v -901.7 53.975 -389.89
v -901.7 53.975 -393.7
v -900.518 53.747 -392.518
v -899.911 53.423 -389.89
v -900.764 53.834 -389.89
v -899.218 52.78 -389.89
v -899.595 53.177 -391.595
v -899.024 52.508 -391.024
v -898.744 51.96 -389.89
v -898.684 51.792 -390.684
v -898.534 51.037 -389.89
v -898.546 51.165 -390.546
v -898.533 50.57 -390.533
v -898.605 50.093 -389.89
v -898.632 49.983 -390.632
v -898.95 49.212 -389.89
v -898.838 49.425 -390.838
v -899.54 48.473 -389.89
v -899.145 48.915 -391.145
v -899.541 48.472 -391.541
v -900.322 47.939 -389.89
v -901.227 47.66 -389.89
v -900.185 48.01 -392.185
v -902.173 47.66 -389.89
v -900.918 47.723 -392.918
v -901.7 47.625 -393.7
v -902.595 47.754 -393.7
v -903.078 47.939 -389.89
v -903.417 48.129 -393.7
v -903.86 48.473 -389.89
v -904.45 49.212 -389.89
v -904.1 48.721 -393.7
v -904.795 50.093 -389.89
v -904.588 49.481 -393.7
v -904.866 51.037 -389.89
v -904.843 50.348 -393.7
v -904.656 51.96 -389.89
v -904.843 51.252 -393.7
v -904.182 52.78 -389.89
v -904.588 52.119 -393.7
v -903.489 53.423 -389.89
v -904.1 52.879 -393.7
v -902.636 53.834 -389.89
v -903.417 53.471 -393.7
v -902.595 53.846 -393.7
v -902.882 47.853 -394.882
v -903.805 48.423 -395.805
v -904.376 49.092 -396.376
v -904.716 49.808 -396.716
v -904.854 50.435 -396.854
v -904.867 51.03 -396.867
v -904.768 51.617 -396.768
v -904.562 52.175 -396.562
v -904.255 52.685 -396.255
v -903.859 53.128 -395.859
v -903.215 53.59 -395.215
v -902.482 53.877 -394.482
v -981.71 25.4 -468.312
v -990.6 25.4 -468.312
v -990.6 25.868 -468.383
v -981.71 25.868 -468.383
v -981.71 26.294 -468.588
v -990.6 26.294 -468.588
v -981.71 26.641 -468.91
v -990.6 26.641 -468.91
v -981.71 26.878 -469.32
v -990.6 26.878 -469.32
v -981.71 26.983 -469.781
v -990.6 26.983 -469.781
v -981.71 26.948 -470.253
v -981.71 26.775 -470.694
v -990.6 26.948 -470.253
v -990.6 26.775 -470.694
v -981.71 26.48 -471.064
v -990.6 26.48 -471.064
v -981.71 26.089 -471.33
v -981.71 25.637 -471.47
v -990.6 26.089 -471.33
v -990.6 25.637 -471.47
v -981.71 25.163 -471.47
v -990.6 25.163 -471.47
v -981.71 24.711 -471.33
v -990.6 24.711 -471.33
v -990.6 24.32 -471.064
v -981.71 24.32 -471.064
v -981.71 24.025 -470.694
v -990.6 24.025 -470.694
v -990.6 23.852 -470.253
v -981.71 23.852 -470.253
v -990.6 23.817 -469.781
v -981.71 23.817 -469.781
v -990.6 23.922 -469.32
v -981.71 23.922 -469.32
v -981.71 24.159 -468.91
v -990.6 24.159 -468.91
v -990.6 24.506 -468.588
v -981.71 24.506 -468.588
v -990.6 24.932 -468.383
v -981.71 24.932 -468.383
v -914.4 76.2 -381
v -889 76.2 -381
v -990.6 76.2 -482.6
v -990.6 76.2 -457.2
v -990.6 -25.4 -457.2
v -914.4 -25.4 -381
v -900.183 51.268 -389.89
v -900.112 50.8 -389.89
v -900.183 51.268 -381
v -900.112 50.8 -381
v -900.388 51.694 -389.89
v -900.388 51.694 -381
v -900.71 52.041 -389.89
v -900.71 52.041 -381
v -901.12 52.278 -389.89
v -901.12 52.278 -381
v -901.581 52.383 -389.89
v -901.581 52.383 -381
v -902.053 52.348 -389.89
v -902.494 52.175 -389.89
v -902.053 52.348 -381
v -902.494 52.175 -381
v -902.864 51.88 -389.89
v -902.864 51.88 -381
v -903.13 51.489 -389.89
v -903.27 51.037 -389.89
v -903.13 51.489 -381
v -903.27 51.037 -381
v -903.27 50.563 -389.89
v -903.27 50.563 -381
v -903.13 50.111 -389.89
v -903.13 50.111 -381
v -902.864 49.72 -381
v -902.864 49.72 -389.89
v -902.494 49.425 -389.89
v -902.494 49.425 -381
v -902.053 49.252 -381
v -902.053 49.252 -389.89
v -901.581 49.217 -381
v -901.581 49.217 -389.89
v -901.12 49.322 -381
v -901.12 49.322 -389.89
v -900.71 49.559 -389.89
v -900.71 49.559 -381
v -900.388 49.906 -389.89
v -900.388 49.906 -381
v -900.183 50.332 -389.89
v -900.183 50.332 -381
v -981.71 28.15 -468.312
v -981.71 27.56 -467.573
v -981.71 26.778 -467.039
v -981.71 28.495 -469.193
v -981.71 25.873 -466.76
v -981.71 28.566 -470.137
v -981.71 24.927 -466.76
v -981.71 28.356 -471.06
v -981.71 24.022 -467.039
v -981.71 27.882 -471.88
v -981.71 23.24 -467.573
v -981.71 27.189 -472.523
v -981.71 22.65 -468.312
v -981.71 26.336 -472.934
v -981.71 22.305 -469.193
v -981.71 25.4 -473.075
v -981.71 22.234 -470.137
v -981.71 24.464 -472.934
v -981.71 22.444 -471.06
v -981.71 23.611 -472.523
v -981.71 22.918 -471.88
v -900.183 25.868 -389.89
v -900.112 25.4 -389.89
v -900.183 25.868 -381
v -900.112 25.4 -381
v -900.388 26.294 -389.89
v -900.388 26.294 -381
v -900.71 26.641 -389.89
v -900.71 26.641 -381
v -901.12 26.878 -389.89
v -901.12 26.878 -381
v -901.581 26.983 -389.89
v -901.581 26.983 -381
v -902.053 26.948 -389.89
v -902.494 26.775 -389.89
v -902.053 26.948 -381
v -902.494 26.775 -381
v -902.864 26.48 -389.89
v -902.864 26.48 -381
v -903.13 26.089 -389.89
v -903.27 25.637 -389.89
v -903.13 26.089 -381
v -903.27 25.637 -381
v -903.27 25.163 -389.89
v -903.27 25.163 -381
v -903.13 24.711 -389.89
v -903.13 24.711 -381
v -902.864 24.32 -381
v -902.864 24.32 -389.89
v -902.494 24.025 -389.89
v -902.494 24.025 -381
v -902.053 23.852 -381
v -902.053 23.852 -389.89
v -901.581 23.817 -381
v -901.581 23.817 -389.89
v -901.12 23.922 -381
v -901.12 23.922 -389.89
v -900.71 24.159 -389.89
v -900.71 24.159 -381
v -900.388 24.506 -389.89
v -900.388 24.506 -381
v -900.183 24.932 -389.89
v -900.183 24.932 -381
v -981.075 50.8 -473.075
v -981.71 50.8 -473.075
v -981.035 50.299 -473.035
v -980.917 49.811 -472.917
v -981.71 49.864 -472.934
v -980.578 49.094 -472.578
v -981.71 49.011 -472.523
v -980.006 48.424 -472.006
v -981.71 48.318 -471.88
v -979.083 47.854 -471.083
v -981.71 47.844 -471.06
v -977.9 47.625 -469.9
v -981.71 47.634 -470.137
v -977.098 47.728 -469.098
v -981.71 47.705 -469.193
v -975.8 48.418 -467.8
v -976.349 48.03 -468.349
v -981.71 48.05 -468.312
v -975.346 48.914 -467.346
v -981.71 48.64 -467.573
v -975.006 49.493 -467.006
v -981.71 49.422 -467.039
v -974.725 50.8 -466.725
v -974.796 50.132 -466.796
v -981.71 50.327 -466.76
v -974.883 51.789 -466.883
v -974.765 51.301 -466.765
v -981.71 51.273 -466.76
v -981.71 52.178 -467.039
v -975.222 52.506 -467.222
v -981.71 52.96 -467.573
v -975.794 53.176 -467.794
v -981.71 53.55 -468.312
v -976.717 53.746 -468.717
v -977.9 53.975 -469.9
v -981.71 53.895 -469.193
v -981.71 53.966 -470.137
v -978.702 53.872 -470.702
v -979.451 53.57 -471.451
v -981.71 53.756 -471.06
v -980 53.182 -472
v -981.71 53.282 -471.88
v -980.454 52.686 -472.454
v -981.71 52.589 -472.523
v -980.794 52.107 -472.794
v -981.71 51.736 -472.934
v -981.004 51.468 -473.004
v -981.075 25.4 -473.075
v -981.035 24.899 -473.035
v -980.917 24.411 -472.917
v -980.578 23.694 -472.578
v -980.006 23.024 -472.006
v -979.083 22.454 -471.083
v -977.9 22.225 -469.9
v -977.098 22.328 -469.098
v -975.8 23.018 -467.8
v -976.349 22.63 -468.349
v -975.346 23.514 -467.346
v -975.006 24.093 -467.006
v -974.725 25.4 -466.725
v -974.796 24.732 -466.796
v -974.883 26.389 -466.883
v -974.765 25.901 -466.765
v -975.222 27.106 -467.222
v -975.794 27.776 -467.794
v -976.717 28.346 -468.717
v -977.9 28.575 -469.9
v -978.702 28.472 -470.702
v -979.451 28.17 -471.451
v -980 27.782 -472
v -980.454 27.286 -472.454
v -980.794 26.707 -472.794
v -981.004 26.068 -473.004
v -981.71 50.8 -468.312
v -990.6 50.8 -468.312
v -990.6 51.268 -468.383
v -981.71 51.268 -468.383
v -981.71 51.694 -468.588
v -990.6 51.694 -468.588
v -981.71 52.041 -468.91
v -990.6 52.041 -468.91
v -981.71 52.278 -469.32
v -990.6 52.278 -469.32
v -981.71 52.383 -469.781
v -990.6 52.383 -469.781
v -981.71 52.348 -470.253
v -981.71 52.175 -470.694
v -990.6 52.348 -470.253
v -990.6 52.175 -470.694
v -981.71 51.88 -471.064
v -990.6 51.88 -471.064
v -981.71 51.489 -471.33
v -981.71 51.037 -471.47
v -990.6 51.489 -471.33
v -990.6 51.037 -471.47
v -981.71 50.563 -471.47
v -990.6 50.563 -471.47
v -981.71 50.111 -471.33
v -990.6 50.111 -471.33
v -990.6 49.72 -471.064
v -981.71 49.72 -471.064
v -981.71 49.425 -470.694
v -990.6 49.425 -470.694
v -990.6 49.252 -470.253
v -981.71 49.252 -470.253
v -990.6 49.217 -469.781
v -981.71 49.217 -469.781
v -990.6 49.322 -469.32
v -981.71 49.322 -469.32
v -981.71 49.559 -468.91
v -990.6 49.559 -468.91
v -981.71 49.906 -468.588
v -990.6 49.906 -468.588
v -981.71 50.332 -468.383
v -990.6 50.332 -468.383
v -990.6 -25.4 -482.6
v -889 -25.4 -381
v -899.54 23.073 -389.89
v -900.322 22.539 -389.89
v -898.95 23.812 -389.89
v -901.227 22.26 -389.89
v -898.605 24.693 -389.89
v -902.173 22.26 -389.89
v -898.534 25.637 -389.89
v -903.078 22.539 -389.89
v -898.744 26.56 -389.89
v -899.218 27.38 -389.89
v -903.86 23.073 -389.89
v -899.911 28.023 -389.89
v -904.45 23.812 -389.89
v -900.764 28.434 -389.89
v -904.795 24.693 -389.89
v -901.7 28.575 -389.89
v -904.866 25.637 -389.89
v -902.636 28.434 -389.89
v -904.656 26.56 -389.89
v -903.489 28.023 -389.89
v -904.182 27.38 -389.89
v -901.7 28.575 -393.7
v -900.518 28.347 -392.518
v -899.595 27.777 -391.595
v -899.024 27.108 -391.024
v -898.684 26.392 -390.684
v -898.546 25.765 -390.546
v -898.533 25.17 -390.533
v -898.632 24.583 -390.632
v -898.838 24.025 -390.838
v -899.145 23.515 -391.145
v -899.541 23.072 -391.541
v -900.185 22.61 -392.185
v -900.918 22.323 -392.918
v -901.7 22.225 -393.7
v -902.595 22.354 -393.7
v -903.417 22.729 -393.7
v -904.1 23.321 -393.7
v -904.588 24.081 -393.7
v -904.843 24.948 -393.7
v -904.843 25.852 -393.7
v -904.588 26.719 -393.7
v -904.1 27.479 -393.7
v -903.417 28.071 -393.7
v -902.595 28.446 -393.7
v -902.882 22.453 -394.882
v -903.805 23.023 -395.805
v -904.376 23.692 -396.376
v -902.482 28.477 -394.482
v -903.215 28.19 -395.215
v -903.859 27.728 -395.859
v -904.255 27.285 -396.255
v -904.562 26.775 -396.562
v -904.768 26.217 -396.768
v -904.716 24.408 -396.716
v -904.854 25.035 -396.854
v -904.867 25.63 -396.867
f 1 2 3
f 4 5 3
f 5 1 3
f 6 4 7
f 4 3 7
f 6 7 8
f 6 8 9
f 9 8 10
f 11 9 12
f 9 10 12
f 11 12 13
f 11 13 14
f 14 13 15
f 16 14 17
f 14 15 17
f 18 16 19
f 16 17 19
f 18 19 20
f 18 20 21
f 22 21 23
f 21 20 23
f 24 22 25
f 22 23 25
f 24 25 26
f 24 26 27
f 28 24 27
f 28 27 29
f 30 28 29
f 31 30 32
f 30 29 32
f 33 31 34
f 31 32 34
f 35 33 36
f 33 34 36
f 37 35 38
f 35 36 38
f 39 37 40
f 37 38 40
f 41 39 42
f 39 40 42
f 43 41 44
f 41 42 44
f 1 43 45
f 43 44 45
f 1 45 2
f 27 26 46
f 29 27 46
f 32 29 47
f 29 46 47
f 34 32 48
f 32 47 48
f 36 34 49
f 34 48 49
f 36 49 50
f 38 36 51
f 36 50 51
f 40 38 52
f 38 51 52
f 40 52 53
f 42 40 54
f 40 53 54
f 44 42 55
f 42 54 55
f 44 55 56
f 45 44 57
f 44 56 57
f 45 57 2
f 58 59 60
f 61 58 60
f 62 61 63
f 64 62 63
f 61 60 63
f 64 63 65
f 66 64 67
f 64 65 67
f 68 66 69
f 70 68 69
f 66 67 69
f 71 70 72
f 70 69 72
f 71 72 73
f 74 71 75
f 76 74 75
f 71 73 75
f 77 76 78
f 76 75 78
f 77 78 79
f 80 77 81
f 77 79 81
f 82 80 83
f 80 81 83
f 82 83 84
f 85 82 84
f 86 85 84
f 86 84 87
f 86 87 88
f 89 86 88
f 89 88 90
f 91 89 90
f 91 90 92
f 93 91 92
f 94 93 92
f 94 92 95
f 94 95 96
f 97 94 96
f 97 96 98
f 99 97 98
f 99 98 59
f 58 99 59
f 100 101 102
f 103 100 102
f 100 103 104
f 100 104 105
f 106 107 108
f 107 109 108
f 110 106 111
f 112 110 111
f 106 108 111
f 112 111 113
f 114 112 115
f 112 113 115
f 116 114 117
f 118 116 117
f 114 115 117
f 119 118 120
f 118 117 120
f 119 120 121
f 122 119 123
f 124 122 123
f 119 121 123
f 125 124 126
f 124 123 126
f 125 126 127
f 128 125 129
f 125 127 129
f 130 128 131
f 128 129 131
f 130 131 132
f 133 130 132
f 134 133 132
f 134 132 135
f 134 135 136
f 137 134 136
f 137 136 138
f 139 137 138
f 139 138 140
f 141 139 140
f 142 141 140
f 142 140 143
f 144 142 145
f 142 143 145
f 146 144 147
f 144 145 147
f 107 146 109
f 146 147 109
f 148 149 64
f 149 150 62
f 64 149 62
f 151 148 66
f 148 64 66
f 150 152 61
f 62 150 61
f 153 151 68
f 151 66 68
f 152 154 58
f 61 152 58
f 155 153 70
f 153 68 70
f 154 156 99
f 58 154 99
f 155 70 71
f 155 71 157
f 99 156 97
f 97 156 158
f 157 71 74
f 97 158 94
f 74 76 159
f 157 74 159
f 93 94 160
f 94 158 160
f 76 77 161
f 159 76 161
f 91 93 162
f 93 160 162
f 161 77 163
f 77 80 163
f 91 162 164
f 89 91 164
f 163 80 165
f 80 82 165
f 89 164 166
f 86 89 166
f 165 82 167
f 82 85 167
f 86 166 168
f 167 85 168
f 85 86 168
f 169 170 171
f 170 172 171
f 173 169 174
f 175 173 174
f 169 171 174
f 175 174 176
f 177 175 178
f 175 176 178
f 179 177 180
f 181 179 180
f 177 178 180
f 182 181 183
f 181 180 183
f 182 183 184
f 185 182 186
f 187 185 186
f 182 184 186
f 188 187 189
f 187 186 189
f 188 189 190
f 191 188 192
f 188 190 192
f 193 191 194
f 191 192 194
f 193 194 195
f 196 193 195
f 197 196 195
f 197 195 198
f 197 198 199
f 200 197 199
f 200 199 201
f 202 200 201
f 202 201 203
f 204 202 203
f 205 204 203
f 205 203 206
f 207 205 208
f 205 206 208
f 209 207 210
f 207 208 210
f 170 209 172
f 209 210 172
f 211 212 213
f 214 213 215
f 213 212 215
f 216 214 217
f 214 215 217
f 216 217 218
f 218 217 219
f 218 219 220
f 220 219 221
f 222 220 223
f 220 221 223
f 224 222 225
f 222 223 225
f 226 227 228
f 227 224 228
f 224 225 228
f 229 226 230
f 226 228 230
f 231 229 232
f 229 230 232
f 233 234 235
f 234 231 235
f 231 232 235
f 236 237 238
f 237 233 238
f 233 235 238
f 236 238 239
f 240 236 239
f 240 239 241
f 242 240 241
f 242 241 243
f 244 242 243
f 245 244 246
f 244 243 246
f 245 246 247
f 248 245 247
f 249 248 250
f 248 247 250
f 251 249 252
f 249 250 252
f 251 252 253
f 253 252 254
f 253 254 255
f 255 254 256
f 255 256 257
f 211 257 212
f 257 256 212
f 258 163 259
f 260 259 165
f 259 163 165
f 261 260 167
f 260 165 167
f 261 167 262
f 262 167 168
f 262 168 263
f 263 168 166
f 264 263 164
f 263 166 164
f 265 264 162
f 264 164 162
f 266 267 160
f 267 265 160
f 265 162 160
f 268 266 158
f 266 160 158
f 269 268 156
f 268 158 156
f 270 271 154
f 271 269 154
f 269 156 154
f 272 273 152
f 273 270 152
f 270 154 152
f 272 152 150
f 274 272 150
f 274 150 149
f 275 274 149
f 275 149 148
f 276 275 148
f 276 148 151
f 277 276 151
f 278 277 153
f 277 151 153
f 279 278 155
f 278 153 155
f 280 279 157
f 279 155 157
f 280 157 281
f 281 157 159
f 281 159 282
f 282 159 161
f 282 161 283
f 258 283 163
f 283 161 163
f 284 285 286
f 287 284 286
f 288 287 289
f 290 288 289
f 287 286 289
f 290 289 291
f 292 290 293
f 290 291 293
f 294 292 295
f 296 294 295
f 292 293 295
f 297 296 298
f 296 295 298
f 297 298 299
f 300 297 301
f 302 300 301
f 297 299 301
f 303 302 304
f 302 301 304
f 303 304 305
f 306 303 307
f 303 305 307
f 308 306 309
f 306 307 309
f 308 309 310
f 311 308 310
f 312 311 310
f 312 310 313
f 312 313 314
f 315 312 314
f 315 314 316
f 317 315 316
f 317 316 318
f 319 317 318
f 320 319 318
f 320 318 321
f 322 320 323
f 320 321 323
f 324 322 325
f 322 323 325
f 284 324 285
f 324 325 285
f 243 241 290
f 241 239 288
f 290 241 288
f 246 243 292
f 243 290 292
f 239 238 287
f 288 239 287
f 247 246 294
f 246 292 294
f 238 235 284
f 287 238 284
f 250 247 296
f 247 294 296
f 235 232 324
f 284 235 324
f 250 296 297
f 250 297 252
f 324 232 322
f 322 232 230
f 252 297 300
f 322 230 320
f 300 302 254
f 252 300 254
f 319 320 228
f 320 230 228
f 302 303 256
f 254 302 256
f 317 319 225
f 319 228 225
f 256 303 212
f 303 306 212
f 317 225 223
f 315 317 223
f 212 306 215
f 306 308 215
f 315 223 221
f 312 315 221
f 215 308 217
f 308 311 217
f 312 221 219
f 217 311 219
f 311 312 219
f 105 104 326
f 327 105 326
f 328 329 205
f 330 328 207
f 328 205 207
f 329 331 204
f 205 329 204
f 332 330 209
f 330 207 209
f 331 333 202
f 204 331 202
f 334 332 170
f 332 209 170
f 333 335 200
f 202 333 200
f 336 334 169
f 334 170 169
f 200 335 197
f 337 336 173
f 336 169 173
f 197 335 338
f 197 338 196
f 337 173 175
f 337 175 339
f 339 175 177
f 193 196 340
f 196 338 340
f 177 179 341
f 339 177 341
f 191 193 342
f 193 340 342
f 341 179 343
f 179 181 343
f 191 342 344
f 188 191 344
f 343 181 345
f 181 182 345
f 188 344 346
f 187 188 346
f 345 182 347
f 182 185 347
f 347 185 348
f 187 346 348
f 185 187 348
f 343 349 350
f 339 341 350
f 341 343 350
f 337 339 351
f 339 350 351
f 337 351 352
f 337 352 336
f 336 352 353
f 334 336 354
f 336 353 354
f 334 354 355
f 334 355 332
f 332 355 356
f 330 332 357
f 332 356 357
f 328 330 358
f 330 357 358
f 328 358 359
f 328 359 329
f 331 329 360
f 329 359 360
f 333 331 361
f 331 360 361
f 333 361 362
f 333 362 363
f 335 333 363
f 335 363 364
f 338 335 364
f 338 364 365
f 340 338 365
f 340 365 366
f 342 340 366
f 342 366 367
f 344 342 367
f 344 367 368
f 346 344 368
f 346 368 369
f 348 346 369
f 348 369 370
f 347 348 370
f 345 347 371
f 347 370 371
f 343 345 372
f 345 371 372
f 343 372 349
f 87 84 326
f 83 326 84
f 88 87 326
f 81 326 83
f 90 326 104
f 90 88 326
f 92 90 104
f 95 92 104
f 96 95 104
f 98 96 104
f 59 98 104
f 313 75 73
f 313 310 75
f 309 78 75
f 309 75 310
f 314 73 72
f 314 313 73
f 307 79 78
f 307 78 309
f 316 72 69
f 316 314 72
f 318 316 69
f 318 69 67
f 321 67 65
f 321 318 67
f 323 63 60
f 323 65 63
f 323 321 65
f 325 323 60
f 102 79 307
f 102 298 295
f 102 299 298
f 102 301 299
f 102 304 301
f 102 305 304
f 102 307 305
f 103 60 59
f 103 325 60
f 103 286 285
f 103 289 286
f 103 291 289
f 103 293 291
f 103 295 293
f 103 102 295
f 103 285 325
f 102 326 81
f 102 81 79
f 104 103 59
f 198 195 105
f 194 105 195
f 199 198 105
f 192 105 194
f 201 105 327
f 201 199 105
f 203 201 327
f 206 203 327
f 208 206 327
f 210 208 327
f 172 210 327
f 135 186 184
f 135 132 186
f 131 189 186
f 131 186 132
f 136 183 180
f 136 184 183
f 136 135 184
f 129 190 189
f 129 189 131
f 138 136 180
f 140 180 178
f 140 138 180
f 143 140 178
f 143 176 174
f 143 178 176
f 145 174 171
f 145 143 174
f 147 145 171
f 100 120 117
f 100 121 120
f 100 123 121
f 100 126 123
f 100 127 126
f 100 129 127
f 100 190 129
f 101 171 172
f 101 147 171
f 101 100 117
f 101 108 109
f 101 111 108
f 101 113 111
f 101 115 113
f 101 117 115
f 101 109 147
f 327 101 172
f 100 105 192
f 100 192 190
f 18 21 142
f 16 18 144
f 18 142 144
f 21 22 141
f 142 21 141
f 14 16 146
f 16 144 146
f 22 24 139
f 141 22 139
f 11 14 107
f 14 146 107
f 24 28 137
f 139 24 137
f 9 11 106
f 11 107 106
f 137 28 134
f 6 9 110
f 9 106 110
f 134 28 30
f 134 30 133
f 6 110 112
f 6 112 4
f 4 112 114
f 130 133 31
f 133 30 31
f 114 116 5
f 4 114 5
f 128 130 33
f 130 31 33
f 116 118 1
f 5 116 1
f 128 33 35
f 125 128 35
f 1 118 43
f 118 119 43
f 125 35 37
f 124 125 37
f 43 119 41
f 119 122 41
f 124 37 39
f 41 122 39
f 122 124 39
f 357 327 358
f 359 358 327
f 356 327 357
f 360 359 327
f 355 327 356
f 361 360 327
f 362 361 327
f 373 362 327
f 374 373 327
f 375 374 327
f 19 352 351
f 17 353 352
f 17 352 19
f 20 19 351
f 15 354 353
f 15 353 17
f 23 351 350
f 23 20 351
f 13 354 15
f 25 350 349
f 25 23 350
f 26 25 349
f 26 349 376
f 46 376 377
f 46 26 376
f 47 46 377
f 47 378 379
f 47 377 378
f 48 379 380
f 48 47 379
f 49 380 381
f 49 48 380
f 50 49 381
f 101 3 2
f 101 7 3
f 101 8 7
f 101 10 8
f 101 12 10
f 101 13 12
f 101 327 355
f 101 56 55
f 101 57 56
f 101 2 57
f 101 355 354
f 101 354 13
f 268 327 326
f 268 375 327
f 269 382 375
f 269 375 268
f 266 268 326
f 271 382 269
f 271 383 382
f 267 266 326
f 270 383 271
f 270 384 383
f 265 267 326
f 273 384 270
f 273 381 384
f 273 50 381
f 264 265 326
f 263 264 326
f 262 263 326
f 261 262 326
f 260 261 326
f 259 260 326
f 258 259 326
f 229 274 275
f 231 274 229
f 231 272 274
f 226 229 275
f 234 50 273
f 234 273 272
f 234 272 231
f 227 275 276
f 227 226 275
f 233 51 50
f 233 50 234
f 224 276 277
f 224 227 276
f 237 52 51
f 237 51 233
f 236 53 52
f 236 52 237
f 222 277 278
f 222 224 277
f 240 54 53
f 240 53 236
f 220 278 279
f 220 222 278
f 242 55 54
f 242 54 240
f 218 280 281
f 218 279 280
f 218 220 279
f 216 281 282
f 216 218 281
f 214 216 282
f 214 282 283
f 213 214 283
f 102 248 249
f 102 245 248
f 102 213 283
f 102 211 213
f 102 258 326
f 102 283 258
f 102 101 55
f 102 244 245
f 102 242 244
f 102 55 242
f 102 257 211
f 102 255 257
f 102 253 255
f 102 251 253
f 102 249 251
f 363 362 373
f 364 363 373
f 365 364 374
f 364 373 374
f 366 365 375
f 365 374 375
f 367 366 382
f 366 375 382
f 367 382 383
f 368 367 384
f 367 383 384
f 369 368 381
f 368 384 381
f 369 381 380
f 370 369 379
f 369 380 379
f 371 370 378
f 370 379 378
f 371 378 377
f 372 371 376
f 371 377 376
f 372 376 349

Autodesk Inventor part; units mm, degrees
ref_plane "YZ Plane" through (0, 0, 0) normal (1, 0, 0) x (0, 1, 0)
ref_plane "XZ Plane" through (0, 0, 0) normal (0, 1, 0) x (-1, 0, 0)
ref_plane "XY Plane" through (0, 0, 0) normal (0, 0, 1) x (1, 0, 0)
sketch "Sketch1" plane through (0, 0, 0) normal (0, 1, 0) x (-1, 0, 0)
  line L0 (6.35, 0) -> (1365.25, 0)
  line L1 (1371.6, -6.35) -> (1371.6, -1365.25)
  line L2 (1365.25, -1371.6) -> (6.35, -1371.6)
  line L3 (0, -1365.25) -> (0, -6.35)
  line L4 (1346.2, -1346.2) -> (1346.2, -25.4)
  line L5 (1346.2, -25.4) -> (25.4, -25.4)
  line L6 (25.4, -25.4) -> (25.4, -1346.2)
  line L7 (25.4, -1346.2) -> (1346.2, -1346.2)
  line L8 (1320.8, -50.8) -> (1320.8, -1320.8)
  line L9 (1320.8, -1320.8) -> (50.8, -1320.8)
  line L10 (50.8, -1320.8) -> (50.8, -50.8)
  line L11 (50.8, -50.8) -> (1320.8, -50.8)
  line L12 (1320.8, -50.8) -> (1346.2, -25.4)
  line L13 (1320.8, -1320.8) -> (1346.2, -1346.2)
  line L14 (50.8, -1320.8) -> (25.4, -1346.2)
  line L15 (50.8, -50.8) -> (25.4, -25.4)
  line L16 (1219.2, -482.6) -> (1016, -482.6)
  line L17 (1016, -482.6) -> (1016, -889)
  line L18 (1016, -889) -> (1219.2, -889)
  line L19 (1219.2, -889) -> (1219.2, -482.6)
  line L20 (355.6, -482.6) -> (152.4, -482.6)
  line L21 (152.4, -482.6) -> (152.4, -889)
  line L22 (152.4, -889) -> (355.6, -889)
  line L23 (355.6, -889) -> (355.6, -482.6)
  line L24 (889, -1016) -> (482.6, -1016)
  line L25 (482.6, -1016) -> (482.6, -1219.2)
  line L26 (482.6, -1219.2) -> (889, -1219.2)
  line L27 (889, -1219.2) -> (889, -1016)
  line L28 (889, -152.4) -> (482.6, -152.4)
  line L29 (482.6, -152.4) -> (482.6, -355.6)
  line L30 (482.6, -355.6) -> (889, -355.6)
  line L31 (889, -355.6) -> (889, -152.4)
  circle A0 centre (685.8, -685.8) radius 254
  line L32 (889, -127) -> (482.6, -127)
  line L33 (457.2, -127) -> (457.2, -381)
  line L34 (457.2, -381) -> (914.4, -381)
  line L35 (914.4, -381) -> (914.4, -127)
  line L36 (1244.6, -457.2) -> (990.6, -457.2)
  line L37 (990.6, -457.2) -> (990.6, -914.4)
  line L38 (990.6, -914.4) -> (1244.6, -914.4)
  line L39 (1244.6, -889) -> (1244.6, -482.6)
  line L40 (914.4, -990.6) -> (457.2, -990.6)
  line L41 (457.2, -990.6) -> (457.2, -1244.6)
  line L42 (482.6, -1244.6) -> (889, -1244.6)
  line L43 (914.4, -1244.6) -> (914.4, -990.6)
  line L44 (381, -457.2) -> (127, -457.2)
  line L45 (127, -482.6) -> (127, -889)
  line L46 (127, -914.4) -> (381, -914.4)
  line L47 (381, -914.4) -> (381, -457.2)
  line L48 (152.4, -482.6) -> (50.8, -482.6)
  line L49 (127, -457.2) -> (50.8, -457.2)
  line L50 (152.4, -889) -> (50.8, -889)
  line L51 (127, -914.4) -> (50.8, -914.4)
  line L52 (355.6, -889) -> (381, -889)
  line L53 (355.6, -482.6) -> (381, -482.6)
  line L54 (457.2, -1244.6) -> (457.2, -1320.8)
  line L55 (482.6, -1219.2) -> (482.6, -1320.8)
  line L56 (889, -1219.2) -> (889, -1320.8)
  line L57 (914.4, -1244.6) -> (914.4, -1320.8)
  line L58 (1244.6, -914.4) -> (1320.8, -914.4)
  line L59 (1219.2, -889) -> (1320.8, -889)
  line L60 (1219.2, -482.6) -> (1320.8, -482.6)
  line L61 (1244.6, -457.2) -> (1320.8, -457.2)
  line L62 (889, -152.4) -> (889, -50.8)
  line L63 (914.4, -127) -> (914.4, -50.8)
  line L64 (482.6, -152.4) -> (482.6, -50.8)
  line L65 (457.2, -127) -> (457.2, -50.8)
  line L66 (889, -1016) -> (889, -990.6)
  line L67 (482.6, -1016) -> (482.6, -990.6)
  line L68 (1016, -889) -> (990.6, -889)
  line L69 (1016, -482.6) -> (990.6, -482.6)
  line L70 (889, -355.6) -> (889, -381)
  line L71 (482.6, -355.6) -> (482.6, -381)
  line L72 (914.4, -381) -> (990.6, -457.2)
  line L73 (990.6, -482.6) -> (889, -381)
  line L74 (990.6, -914.4) -> (914.4, -990.6)
  line L75 (889, -990.6) -> (990.6, -889)
  line L76 (381, -914.4) -> (457.2, -990.6)
  line L77 (482.6, -990.6) -> (381, -889)
  line L78 (457.2, -381) -> (381, -457.2)
  line L79 (482.6, -381) -> (381, -482.6)
  line L80 (1257.3, -50.8) -> (1320.8, -114.3)
  line L81 (1320.8, -1257.3) -> (1257.3, -1320.8)
  line L82 (50.8, -1257.3) -> (114.3, -1320.8)
  line L83 (50.8, -114.3) -> (114.3, -50.8)
  line L84 (68.7605, -132.2605) -> (132.2605, -68.7605)
  line L85 (68.7605, -1239.3395) -> (132.2605, -1302.8395)
  line L86 (1302.8395, -1239.3395) -> (1239.3395, -1302.8395)
  line L87 (1239.3395, -68.7605) -> (1302.8395, -132.2605)
  line L88 (1302.8395, -132.2605) -> (1320.8, -150.221)
  line L89 (1239.3395, -68.7605) -> (1221.379, -50.8)
  line L90 (1302.8395, -1239.3395) -> (1320.8, -1221.379)
  line L91 (1239.3395, -1302.8395) -> (1221.379, -1320.8)
  line L92 (132.2605, -1302.8395) -> (150.221, -1320.8)
  line L93 (68.7605, -1239.3395) -> (50.8, -1221.379)
  line L94 (132.2605, -68.7605) -> (150.221, -50.8)
  line L95 (68.7605, -132.2605) -> (50.8, -150.221)
  line L96 (1365.25, 0) -> (1371.6, -6.35)
  line L97 (1371.6, -1365.25) -> (1365.25, -1371.6)
  line L98 (6.35, -1371.6) -> (0, -1365.25)
  line L99 (6.35, 0) -> (0, -6.35)
  point P0 (0, 0)
  point P1 (1371.6, -1371.6)
  point P2 (1371.6, 0)
  point P3 (0, -1371.6)
  dimension "d0" = 1371.6
  dimension "d1" = 1371.6
  dimension "d2" = 25.4
  dimension "d3" = 25.4
  dimension "d4" = 203.2
  dimension "d5" = 406.4
  dimension "d6" = 203.2
  dimension "d7" = 406.4
  dimension "d8" = 406.4
  dimension "d9" = 203.2
  dimension "d10" = 406.4
  dimension "d11" = 203.2
  dimension "d12" = 101.6
  dimension "d13" = 101.6
  dimension "d14" = 101.6
  dimension "d15" = 101.6
  dimension "d16" = 431.8
  dimension "d17" = 431.8
  dimension "d18" = 431.8
  dimension "d19" = 431.8
  dimension "d20" = 508
  dimension "d21" = 25.4
  dimension "d22" = 25.4
  dimension "d23" = 25.4
  dimension "d24" = 25.4
  dimension "d25" = 45
  dimension "d26" = 63.5
  dimension "d27" = 45
  dimension "d28" = 45
  dimension "d29" = 45
  dimension "d30" = 25.4
  dimension "d31" = 25.4
  dimension "d32" = 25.4
  dimension "d33" = 25.4
  dimension "d34" = 6.35
  dimension "d35" = 6.35
  dimension "d36" = 6.35
  dimension "d37" = 6.35
  dimension "d38" = 6.35
  dimension "d39" = 6.35
  dimension "d40" = 6.35
  dimension "d41" = 6.35
extrude "Extrusion1" add sketch "Sketch1" along normal blind 76.2 contours L37 L73 L34 L72
sketch "Sketch2" plane through (-914.4, 0, -381) normal (0, 0, 1) x (1, 0, 0)
  circle A0 centre (12.7, 50.8) radius 1.5875
  circle A1 centre (12.7, 25.4) radius 1.5875
  line L0 (25.4, 0) -> (25.4, 76.2) projected
  line L1 (0, 76.2) -> (25.4, 76.2) projected
  line L2 (0, 0) -> (25.4, 0) projected
  point P0 (914.4, 0)
  point P1 (12.7, 76.2)
  dimension "d44" = 3.175
  dimension "d45" = 3.175
  dimension "d46" = 12.7
  dimension "d47" = 25.4
  dimension "d48" = 25.4
  dimension "d49" = 12.7
extrude "Extrusion2" cut sketch "Sketch2" against normal blind 76.2
sketch "Sketch3" plane through (-990.6, 0, -482.6) normal (-1, 0, 0) x (0, 0, 1)
  circle A0 centre (12.7, 25.4) radius 1.5875
  circle A1 centre (12.7, 50.8) radius 1.5875
  line L0 (0, 0) -> (0, 76.2) projected
  line L1 (0, 76.2) -> (25.4, 76.2) projected
  line L2 (0, 0) -> (25.4, 0) projected
  point P0 (482.6, 0)
  point P1 (12.7, 76.2)
  dimension "d52" = 3.175
  dimension "d53" = 3.175
  dimension "d54" = 12.7
  dimension "d55" = 12.7
  dimension "d56" = 25.4
  dimension "d57" = 25.4
extrude "Extrusion3" cut sketch "Sketch3" against normal blind 76.2
hole "Hole1" at (-977.9, 50.8, -469.9) direction (1, 0, 0) diameter 6.35 depth 3.81
hole "Hole2" at (-977.9, 25.4, -469.9) direction (1, 0, 0) diameter 6.35 depth 3.81
hole "Hole3" at (-901.7, 50.8, -393.7) direction (0, 0, -1) diameter 6.35 depth 3.81
hole "Hole4" at (-901.7, 25.4, -393.7) direction (0, 0, -1) diameter 6.35 depth 3.81
hole "Hole5" at (-977.9, 50.8, -469.9) direction (-1, 0, 0) diameter 6.35 depth 3.81
hole "Hole6" at (-977.9, 25.4, -469.9) direction (-1, 0, 0) diameter 6.35 depth 3.81
hole "Hole7" at (-901.7, 25.4, -393.7) direction (0, 0, 1) diameter 6.35 depth 3.81
hole "Hole8" at (-901.7, 50.8, -393.7) direction (0, 0, 1) diameter 6.35 depth 3.81
sketch "Sketch4" plane through (0, 76.2, 0) normal (0, 1, 0) x (1, 0, 0)
  point P0 (0, 0)
sketch "Sketch5" plane through (0, 0, 0) normal (0, -1, 0) x (1, 0, 0)
  line L0 (-914.4, -381) -> (-889, -381) projected
  line L1 (-990.6, -457.2) -> (-914.4, -381) projected
  line L2 (-990.6, -482.6) -> (-990.6, -457.2) projected
  line L3 (-889, -381) -> (-990.6, -482.6) projected
  point P0 (0, 0)
extrude "Extrusion4" add sketch "Sketch5" along normal blind 25.4
equation "\"d35\" = d34"
equation "\"d36\" = d34"
equation "\"d37\" = d36"
equation "\"d38\" = d34"
equation "\"d39\" = d38"
equation "\"d40\" = d34"
equation "\"d41\" = d40"
properties part number "angle interior piece X4"
